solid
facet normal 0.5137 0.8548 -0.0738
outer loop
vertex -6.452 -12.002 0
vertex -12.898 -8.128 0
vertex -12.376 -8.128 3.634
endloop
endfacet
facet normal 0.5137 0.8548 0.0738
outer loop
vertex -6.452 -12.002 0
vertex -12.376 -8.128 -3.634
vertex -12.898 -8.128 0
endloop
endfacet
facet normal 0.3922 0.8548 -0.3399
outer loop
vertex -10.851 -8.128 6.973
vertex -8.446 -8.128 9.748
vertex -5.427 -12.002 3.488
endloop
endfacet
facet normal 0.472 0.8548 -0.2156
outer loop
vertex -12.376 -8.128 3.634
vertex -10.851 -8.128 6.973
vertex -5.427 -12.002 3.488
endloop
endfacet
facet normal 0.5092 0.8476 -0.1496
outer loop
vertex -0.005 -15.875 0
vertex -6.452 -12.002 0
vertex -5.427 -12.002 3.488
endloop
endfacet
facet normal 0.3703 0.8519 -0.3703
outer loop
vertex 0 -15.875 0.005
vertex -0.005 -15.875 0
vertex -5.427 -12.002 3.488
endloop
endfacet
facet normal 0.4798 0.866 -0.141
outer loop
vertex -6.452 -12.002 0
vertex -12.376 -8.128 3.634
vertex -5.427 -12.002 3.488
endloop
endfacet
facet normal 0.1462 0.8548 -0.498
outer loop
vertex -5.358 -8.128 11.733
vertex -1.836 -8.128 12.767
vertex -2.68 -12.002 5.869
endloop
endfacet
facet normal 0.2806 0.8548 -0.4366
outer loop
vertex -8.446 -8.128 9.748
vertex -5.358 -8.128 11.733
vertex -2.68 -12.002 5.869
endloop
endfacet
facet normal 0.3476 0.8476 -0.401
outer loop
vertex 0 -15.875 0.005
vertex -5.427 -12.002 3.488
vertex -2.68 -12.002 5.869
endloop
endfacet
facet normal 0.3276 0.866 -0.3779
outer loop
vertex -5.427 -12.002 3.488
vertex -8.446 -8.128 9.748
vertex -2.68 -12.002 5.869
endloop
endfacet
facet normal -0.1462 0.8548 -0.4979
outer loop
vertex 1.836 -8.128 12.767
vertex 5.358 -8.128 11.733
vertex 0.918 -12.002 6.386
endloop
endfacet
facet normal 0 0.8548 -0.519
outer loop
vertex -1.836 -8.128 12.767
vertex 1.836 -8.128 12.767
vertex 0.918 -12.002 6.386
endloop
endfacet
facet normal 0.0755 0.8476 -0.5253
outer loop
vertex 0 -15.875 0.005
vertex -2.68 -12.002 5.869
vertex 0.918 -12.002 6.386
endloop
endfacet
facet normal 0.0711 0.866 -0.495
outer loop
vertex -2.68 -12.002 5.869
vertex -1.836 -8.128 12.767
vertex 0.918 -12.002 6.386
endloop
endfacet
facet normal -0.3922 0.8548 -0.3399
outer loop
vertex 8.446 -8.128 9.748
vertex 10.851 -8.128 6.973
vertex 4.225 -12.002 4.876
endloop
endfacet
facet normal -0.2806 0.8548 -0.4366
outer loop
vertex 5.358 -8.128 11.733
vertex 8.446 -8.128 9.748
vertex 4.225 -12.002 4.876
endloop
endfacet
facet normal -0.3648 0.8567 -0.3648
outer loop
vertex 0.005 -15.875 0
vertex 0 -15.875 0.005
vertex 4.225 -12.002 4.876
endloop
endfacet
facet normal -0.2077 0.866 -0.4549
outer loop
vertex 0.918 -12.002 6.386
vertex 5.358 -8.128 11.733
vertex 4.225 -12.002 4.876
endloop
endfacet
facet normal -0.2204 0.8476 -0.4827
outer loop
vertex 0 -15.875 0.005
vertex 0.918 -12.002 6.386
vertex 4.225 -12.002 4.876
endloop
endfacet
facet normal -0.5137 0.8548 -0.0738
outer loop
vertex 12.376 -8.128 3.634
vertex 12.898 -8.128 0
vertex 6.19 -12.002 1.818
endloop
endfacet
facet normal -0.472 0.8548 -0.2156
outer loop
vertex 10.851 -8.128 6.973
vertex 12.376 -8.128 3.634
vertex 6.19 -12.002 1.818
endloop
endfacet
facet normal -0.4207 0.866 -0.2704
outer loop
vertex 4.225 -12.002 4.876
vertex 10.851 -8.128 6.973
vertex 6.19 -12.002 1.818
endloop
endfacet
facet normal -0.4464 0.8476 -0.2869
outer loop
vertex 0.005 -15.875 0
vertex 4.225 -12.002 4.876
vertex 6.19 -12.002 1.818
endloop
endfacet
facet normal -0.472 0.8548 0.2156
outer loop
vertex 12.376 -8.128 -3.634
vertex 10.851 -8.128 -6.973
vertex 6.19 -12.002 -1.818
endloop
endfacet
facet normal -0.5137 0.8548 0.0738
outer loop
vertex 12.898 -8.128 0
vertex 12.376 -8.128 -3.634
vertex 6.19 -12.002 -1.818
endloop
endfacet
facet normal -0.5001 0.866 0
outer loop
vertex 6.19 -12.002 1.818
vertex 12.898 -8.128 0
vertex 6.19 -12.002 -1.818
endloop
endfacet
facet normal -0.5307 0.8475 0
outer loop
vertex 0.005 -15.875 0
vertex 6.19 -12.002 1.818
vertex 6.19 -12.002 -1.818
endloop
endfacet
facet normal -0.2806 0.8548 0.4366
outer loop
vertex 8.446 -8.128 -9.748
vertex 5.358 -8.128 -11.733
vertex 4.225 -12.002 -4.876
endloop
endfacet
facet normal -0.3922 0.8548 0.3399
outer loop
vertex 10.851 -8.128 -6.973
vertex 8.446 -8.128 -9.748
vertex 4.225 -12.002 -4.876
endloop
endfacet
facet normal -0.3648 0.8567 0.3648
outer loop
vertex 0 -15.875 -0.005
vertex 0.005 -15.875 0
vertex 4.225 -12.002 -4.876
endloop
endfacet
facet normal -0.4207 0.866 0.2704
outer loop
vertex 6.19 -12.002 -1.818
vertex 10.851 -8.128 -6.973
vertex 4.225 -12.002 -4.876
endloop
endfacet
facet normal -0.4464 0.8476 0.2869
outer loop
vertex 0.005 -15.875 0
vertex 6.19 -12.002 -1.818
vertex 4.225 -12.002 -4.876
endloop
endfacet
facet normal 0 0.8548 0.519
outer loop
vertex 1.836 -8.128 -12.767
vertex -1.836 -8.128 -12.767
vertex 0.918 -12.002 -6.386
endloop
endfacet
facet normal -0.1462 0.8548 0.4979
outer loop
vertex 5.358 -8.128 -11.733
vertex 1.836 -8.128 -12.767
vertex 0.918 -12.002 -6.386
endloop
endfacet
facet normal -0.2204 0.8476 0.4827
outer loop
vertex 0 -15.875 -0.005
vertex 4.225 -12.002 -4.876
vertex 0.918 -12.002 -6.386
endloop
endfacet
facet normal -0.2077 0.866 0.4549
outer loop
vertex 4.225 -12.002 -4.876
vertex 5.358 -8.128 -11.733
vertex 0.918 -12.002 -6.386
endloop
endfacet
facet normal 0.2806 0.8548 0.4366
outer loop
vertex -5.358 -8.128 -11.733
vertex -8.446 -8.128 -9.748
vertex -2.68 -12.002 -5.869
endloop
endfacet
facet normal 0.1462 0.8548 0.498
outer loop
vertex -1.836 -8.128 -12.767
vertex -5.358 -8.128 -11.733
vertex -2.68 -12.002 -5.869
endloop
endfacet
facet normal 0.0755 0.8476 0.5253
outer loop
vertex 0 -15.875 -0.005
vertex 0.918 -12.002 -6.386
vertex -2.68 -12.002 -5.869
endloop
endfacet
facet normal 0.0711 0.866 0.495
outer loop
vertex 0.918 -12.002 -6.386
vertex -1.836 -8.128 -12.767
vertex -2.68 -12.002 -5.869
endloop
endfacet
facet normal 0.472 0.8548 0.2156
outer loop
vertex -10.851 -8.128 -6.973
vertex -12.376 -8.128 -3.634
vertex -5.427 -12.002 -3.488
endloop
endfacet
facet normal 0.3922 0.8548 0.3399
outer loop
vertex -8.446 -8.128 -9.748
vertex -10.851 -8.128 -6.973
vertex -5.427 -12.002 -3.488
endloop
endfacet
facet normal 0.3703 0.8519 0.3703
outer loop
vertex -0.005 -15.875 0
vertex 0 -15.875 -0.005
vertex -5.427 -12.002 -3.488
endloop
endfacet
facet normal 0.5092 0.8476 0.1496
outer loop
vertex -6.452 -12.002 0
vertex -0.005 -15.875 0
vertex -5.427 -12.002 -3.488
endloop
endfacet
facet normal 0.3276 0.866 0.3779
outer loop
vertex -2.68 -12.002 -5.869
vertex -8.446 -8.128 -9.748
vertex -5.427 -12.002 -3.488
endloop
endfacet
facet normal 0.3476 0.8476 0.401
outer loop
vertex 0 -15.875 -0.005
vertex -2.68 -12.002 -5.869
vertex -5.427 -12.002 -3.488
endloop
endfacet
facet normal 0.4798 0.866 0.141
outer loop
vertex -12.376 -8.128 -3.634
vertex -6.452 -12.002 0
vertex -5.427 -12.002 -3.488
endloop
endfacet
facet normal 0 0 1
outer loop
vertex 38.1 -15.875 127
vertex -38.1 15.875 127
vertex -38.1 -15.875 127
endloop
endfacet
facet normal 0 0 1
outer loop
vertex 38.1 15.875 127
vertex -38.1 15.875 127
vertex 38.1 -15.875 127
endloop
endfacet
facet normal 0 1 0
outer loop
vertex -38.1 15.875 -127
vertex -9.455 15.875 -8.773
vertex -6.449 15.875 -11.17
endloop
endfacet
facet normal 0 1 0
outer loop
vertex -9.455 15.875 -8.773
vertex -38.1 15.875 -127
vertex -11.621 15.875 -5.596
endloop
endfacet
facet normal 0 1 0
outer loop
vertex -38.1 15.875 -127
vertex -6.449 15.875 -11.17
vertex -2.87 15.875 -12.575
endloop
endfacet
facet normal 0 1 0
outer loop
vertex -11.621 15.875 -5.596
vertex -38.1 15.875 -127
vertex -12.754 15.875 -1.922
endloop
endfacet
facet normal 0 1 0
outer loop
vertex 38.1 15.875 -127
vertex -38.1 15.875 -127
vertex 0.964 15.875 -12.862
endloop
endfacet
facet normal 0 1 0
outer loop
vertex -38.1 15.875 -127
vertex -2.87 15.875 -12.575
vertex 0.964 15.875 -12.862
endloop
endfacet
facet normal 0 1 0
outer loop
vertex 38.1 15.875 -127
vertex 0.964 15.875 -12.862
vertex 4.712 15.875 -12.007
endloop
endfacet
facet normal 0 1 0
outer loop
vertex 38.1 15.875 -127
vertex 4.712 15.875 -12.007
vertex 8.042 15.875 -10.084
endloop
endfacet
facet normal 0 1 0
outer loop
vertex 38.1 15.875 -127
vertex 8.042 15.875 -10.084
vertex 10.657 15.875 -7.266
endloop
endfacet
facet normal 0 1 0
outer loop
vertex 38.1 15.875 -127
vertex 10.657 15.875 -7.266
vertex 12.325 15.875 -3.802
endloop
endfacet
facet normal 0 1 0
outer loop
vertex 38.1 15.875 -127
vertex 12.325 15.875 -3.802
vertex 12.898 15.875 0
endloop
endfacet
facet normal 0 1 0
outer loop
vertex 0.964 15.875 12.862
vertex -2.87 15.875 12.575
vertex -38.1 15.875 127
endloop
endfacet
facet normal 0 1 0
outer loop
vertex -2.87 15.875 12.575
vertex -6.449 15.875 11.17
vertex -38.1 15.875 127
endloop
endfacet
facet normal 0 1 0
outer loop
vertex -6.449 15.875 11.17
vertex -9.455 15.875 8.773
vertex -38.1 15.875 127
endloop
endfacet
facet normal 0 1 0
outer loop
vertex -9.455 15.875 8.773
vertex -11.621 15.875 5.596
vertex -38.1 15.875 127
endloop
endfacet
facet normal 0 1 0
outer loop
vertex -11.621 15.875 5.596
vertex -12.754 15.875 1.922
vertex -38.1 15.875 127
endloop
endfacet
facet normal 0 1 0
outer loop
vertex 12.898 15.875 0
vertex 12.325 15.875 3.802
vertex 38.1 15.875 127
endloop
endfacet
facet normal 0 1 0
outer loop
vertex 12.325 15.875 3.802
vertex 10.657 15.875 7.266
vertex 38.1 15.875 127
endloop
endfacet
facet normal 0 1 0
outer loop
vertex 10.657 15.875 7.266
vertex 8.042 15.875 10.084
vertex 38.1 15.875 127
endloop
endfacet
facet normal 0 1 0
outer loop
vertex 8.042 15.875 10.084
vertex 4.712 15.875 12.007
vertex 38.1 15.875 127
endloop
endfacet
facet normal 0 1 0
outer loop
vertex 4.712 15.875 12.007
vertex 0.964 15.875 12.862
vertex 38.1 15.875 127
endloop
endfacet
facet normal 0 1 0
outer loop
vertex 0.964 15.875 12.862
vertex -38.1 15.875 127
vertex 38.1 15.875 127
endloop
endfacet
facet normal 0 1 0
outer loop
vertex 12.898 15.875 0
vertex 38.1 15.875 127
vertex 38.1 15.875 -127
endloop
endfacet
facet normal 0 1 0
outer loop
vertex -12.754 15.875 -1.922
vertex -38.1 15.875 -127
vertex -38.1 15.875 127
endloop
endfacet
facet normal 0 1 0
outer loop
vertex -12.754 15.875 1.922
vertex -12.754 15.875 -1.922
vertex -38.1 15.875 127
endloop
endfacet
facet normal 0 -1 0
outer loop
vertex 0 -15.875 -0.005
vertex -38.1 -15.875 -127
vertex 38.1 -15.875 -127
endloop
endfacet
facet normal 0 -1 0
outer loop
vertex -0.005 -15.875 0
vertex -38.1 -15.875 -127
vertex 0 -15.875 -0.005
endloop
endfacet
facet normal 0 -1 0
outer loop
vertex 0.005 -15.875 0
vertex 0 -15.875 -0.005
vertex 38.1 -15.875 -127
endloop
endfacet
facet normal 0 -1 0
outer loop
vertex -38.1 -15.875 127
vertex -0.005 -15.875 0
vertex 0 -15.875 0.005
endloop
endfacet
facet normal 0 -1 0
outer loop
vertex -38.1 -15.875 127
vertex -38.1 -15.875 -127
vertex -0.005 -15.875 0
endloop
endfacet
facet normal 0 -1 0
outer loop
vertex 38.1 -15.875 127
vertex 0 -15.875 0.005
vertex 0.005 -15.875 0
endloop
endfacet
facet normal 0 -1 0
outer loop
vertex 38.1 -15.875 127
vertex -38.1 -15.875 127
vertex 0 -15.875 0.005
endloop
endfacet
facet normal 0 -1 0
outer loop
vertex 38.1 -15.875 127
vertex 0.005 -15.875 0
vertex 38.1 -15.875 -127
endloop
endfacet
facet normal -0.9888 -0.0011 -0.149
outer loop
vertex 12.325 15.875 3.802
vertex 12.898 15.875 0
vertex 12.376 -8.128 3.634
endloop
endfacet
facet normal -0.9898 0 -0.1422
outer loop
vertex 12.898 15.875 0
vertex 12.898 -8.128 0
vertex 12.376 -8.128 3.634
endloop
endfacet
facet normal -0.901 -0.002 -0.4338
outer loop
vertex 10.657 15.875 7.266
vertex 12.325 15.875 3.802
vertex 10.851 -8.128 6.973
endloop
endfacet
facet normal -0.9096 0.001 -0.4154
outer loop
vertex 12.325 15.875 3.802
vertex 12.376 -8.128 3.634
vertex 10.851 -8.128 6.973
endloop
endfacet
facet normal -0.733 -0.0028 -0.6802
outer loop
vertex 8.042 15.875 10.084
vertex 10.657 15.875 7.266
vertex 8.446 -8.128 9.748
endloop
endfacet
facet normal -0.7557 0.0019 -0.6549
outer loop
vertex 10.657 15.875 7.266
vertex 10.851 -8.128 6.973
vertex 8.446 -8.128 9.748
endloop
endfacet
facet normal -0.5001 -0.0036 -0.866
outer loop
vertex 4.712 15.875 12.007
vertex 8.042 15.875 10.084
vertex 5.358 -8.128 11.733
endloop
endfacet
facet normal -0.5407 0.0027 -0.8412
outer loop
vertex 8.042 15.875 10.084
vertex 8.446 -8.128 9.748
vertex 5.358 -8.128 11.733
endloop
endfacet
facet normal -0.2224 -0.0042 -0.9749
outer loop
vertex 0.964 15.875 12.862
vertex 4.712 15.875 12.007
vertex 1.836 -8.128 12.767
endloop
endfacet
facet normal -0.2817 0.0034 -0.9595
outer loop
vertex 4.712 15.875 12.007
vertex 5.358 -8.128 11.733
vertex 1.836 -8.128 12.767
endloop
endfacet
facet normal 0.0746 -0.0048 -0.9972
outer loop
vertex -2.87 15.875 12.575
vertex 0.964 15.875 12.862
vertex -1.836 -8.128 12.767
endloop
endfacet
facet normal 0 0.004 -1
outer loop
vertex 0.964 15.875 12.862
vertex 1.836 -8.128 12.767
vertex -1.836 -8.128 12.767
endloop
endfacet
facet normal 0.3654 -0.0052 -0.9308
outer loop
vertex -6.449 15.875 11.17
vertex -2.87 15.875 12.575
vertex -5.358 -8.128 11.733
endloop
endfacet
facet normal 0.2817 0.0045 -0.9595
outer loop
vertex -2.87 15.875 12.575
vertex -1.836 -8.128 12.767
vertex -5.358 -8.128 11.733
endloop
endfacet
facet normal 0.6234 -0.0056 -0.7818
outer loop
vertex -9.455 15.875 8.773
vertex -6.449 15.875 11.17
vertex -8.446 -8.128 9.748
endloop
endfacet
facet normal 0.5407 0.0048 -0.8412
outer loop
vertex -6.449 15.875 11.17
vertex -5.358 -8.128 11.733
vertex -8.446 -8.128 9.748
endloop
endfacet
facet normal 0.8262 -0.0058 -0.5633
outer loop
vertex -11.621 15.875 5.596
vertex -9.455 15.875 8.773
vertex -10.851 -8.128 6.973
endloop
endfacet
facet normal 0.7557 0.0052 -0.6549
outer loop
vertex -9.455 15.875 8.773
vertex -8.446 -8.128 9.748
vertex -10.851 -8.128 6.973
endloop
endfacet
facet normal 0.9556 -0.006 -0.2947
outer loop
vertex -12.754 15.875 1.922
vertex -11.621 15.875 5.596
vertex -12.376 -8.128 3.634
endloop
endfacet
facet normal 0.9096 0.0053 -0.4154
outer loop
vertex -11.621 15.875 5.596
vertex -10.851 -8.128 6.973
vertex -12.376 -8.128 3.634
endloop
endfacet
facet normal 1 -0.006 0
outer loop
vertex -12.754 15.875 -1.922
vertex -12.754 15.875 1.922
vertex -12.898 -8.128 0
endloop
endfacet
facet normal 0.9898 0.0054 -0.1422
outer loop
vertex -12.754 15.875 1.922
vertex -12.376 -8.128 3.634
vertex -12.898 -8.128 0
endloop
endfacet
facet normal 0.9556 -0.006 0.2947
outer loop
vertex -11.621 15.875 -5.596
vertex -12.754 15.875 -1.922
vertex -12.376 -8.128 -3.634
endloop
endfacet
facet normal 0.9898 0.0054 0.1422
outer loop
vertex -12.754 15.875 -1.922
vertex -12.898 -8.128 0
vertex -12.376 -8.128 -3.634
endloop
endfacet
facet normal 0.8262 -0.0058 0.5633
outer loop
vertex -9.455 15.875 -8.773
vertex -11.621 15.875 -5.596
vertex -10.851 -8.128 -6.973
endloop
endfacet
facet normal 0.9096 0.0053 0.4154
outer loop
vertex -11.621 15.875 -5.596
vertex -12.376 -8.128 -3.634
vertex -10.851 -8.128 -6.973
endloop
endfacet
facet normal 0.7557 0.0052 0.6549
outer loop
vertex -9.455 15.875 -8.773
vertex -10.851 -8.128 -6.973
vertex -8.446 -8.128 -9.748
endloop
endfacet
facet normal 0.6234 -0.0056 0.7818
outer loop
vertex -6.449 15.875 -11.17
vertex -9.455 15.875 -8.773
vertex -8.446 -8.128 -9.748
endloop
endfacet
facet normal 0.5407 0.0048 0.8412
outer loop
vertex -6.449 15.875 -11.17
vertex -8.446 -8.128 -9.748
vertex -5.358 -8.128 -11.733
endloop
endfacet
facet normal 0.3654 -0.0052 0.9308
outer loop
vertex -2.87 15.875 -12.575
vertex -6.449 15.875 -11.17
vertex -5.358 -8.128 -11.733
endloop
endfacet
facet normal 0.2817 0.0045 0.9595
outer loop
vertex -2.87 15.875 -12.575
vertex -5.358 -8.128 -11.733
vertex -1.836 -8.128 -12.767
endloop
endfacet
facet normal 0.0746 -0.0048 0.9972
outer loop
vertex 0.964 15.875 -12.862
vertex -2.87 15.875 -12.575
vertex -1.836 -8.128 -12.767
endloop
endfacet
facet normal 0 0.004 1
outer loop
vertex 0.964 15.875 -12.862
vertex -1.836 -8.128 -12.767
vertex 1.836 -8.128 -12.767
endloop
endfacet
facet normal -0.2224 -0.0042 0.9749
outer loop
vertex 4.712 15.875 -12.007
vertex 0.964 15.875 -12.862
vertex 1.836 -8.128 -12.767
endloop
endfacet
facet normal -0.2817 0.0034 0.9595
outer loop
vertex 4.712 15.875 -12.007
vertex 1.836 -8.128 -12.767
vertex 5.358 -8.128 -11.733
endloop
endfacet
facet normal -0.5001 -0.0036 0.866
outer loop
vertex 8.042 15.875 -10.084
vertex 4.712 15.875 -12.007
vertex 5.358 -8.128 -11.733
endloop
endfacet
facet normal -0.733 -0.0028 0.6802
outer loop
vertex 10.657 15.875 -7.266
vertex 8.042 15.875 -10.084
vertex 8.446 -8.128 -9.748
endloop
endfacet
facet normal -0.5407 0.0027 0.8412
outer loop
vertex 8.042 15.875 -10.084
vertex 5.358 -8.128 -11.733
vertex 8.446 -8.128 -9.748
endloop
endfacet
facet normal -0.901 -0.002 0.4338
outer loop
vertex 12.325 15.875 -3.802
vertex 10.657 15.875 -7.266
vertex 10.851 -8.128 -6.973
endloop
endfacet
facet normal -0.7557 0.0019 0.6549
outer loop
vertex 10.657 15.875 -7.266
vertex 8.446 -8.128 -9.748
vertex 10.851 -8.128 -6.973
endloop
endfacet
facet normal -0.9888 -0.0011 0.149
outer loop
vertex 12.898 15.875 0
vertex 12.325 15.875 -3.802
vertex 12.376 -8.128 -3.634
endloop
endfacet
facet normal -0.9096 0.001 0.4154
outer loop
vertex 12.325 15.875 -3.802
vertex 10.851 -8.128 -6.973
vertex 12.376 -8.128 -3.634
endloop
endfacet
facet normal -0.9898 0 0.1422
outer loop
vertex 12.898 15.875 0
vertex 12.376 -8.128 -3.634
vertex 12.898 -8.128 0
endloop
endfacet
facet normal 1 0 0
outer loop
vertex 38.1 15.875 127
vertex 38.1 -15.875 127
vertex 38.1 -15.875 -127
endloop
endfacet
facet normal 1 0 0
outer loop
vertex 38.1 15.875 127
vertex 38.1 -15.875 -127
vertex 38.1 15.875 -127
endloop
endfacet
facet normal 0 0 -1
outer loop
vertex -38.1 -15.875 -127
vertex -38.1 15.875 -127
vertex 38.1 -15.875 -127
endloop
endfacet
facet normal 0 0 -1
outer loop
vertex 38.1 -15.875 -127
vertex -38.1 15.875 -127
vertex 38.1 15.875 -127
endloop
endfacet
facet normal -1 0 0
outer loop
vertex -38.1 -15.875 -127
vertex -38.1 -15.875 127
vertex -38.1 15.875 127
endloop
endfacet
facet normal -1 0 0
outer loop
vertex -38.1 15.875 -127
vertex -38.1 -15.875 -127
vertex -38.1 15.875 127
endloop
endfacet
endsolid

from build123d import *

# Parameters (mm, degrees)
SKETCH1_W                 = 76.2
SKETCH1_H                 = 31.75
BOSS_EXTRUDE1_DEPTH       = 127
F_1_CLEARANCE_HOLE1_D     = 25.79624
F_1_CLEARANCE_HOLE1_DEPTH = 24.003
F_1_CLEARANCE_HOLE1_TIP   = 7.749972367


with BuildPart() as part:
    # Sketch1 → Boss-Extrude1 (new body, symmetric)
    with BuildSketch(Plane.XY):
        Rectangle(SKETCH1_W, SKETCH1_H)
    extrude(amount=BOSS_EXTRUDE1_DEPTH, both=True)

    # 1 Clearance Hole1
    with Locations(Plane(origin=(0, 15.875, 0), x_dir=(-1, 0, 0), z_dir=(0, 1, 0))):
        with Locations((0, 0)):
            Hole(F_1_CLEARANCE_HOLE1_D / 2, depth=F_1_CLEARANCE_HOLE1_DEPTH)
            with Locations((0, 0, -(F_1_CLEARANCE_HOLE1_DEPTH + F_1_CLEARANCE_HOLE1_TIP / 2))):  # 118° drill point
                Cone(0, F_1_CLEARANCE_HOLE1_D / 2, F_1_CLEARANCE_HOLE1_TIP, mode=Mode.SUBTRACT)


solid = part.part
